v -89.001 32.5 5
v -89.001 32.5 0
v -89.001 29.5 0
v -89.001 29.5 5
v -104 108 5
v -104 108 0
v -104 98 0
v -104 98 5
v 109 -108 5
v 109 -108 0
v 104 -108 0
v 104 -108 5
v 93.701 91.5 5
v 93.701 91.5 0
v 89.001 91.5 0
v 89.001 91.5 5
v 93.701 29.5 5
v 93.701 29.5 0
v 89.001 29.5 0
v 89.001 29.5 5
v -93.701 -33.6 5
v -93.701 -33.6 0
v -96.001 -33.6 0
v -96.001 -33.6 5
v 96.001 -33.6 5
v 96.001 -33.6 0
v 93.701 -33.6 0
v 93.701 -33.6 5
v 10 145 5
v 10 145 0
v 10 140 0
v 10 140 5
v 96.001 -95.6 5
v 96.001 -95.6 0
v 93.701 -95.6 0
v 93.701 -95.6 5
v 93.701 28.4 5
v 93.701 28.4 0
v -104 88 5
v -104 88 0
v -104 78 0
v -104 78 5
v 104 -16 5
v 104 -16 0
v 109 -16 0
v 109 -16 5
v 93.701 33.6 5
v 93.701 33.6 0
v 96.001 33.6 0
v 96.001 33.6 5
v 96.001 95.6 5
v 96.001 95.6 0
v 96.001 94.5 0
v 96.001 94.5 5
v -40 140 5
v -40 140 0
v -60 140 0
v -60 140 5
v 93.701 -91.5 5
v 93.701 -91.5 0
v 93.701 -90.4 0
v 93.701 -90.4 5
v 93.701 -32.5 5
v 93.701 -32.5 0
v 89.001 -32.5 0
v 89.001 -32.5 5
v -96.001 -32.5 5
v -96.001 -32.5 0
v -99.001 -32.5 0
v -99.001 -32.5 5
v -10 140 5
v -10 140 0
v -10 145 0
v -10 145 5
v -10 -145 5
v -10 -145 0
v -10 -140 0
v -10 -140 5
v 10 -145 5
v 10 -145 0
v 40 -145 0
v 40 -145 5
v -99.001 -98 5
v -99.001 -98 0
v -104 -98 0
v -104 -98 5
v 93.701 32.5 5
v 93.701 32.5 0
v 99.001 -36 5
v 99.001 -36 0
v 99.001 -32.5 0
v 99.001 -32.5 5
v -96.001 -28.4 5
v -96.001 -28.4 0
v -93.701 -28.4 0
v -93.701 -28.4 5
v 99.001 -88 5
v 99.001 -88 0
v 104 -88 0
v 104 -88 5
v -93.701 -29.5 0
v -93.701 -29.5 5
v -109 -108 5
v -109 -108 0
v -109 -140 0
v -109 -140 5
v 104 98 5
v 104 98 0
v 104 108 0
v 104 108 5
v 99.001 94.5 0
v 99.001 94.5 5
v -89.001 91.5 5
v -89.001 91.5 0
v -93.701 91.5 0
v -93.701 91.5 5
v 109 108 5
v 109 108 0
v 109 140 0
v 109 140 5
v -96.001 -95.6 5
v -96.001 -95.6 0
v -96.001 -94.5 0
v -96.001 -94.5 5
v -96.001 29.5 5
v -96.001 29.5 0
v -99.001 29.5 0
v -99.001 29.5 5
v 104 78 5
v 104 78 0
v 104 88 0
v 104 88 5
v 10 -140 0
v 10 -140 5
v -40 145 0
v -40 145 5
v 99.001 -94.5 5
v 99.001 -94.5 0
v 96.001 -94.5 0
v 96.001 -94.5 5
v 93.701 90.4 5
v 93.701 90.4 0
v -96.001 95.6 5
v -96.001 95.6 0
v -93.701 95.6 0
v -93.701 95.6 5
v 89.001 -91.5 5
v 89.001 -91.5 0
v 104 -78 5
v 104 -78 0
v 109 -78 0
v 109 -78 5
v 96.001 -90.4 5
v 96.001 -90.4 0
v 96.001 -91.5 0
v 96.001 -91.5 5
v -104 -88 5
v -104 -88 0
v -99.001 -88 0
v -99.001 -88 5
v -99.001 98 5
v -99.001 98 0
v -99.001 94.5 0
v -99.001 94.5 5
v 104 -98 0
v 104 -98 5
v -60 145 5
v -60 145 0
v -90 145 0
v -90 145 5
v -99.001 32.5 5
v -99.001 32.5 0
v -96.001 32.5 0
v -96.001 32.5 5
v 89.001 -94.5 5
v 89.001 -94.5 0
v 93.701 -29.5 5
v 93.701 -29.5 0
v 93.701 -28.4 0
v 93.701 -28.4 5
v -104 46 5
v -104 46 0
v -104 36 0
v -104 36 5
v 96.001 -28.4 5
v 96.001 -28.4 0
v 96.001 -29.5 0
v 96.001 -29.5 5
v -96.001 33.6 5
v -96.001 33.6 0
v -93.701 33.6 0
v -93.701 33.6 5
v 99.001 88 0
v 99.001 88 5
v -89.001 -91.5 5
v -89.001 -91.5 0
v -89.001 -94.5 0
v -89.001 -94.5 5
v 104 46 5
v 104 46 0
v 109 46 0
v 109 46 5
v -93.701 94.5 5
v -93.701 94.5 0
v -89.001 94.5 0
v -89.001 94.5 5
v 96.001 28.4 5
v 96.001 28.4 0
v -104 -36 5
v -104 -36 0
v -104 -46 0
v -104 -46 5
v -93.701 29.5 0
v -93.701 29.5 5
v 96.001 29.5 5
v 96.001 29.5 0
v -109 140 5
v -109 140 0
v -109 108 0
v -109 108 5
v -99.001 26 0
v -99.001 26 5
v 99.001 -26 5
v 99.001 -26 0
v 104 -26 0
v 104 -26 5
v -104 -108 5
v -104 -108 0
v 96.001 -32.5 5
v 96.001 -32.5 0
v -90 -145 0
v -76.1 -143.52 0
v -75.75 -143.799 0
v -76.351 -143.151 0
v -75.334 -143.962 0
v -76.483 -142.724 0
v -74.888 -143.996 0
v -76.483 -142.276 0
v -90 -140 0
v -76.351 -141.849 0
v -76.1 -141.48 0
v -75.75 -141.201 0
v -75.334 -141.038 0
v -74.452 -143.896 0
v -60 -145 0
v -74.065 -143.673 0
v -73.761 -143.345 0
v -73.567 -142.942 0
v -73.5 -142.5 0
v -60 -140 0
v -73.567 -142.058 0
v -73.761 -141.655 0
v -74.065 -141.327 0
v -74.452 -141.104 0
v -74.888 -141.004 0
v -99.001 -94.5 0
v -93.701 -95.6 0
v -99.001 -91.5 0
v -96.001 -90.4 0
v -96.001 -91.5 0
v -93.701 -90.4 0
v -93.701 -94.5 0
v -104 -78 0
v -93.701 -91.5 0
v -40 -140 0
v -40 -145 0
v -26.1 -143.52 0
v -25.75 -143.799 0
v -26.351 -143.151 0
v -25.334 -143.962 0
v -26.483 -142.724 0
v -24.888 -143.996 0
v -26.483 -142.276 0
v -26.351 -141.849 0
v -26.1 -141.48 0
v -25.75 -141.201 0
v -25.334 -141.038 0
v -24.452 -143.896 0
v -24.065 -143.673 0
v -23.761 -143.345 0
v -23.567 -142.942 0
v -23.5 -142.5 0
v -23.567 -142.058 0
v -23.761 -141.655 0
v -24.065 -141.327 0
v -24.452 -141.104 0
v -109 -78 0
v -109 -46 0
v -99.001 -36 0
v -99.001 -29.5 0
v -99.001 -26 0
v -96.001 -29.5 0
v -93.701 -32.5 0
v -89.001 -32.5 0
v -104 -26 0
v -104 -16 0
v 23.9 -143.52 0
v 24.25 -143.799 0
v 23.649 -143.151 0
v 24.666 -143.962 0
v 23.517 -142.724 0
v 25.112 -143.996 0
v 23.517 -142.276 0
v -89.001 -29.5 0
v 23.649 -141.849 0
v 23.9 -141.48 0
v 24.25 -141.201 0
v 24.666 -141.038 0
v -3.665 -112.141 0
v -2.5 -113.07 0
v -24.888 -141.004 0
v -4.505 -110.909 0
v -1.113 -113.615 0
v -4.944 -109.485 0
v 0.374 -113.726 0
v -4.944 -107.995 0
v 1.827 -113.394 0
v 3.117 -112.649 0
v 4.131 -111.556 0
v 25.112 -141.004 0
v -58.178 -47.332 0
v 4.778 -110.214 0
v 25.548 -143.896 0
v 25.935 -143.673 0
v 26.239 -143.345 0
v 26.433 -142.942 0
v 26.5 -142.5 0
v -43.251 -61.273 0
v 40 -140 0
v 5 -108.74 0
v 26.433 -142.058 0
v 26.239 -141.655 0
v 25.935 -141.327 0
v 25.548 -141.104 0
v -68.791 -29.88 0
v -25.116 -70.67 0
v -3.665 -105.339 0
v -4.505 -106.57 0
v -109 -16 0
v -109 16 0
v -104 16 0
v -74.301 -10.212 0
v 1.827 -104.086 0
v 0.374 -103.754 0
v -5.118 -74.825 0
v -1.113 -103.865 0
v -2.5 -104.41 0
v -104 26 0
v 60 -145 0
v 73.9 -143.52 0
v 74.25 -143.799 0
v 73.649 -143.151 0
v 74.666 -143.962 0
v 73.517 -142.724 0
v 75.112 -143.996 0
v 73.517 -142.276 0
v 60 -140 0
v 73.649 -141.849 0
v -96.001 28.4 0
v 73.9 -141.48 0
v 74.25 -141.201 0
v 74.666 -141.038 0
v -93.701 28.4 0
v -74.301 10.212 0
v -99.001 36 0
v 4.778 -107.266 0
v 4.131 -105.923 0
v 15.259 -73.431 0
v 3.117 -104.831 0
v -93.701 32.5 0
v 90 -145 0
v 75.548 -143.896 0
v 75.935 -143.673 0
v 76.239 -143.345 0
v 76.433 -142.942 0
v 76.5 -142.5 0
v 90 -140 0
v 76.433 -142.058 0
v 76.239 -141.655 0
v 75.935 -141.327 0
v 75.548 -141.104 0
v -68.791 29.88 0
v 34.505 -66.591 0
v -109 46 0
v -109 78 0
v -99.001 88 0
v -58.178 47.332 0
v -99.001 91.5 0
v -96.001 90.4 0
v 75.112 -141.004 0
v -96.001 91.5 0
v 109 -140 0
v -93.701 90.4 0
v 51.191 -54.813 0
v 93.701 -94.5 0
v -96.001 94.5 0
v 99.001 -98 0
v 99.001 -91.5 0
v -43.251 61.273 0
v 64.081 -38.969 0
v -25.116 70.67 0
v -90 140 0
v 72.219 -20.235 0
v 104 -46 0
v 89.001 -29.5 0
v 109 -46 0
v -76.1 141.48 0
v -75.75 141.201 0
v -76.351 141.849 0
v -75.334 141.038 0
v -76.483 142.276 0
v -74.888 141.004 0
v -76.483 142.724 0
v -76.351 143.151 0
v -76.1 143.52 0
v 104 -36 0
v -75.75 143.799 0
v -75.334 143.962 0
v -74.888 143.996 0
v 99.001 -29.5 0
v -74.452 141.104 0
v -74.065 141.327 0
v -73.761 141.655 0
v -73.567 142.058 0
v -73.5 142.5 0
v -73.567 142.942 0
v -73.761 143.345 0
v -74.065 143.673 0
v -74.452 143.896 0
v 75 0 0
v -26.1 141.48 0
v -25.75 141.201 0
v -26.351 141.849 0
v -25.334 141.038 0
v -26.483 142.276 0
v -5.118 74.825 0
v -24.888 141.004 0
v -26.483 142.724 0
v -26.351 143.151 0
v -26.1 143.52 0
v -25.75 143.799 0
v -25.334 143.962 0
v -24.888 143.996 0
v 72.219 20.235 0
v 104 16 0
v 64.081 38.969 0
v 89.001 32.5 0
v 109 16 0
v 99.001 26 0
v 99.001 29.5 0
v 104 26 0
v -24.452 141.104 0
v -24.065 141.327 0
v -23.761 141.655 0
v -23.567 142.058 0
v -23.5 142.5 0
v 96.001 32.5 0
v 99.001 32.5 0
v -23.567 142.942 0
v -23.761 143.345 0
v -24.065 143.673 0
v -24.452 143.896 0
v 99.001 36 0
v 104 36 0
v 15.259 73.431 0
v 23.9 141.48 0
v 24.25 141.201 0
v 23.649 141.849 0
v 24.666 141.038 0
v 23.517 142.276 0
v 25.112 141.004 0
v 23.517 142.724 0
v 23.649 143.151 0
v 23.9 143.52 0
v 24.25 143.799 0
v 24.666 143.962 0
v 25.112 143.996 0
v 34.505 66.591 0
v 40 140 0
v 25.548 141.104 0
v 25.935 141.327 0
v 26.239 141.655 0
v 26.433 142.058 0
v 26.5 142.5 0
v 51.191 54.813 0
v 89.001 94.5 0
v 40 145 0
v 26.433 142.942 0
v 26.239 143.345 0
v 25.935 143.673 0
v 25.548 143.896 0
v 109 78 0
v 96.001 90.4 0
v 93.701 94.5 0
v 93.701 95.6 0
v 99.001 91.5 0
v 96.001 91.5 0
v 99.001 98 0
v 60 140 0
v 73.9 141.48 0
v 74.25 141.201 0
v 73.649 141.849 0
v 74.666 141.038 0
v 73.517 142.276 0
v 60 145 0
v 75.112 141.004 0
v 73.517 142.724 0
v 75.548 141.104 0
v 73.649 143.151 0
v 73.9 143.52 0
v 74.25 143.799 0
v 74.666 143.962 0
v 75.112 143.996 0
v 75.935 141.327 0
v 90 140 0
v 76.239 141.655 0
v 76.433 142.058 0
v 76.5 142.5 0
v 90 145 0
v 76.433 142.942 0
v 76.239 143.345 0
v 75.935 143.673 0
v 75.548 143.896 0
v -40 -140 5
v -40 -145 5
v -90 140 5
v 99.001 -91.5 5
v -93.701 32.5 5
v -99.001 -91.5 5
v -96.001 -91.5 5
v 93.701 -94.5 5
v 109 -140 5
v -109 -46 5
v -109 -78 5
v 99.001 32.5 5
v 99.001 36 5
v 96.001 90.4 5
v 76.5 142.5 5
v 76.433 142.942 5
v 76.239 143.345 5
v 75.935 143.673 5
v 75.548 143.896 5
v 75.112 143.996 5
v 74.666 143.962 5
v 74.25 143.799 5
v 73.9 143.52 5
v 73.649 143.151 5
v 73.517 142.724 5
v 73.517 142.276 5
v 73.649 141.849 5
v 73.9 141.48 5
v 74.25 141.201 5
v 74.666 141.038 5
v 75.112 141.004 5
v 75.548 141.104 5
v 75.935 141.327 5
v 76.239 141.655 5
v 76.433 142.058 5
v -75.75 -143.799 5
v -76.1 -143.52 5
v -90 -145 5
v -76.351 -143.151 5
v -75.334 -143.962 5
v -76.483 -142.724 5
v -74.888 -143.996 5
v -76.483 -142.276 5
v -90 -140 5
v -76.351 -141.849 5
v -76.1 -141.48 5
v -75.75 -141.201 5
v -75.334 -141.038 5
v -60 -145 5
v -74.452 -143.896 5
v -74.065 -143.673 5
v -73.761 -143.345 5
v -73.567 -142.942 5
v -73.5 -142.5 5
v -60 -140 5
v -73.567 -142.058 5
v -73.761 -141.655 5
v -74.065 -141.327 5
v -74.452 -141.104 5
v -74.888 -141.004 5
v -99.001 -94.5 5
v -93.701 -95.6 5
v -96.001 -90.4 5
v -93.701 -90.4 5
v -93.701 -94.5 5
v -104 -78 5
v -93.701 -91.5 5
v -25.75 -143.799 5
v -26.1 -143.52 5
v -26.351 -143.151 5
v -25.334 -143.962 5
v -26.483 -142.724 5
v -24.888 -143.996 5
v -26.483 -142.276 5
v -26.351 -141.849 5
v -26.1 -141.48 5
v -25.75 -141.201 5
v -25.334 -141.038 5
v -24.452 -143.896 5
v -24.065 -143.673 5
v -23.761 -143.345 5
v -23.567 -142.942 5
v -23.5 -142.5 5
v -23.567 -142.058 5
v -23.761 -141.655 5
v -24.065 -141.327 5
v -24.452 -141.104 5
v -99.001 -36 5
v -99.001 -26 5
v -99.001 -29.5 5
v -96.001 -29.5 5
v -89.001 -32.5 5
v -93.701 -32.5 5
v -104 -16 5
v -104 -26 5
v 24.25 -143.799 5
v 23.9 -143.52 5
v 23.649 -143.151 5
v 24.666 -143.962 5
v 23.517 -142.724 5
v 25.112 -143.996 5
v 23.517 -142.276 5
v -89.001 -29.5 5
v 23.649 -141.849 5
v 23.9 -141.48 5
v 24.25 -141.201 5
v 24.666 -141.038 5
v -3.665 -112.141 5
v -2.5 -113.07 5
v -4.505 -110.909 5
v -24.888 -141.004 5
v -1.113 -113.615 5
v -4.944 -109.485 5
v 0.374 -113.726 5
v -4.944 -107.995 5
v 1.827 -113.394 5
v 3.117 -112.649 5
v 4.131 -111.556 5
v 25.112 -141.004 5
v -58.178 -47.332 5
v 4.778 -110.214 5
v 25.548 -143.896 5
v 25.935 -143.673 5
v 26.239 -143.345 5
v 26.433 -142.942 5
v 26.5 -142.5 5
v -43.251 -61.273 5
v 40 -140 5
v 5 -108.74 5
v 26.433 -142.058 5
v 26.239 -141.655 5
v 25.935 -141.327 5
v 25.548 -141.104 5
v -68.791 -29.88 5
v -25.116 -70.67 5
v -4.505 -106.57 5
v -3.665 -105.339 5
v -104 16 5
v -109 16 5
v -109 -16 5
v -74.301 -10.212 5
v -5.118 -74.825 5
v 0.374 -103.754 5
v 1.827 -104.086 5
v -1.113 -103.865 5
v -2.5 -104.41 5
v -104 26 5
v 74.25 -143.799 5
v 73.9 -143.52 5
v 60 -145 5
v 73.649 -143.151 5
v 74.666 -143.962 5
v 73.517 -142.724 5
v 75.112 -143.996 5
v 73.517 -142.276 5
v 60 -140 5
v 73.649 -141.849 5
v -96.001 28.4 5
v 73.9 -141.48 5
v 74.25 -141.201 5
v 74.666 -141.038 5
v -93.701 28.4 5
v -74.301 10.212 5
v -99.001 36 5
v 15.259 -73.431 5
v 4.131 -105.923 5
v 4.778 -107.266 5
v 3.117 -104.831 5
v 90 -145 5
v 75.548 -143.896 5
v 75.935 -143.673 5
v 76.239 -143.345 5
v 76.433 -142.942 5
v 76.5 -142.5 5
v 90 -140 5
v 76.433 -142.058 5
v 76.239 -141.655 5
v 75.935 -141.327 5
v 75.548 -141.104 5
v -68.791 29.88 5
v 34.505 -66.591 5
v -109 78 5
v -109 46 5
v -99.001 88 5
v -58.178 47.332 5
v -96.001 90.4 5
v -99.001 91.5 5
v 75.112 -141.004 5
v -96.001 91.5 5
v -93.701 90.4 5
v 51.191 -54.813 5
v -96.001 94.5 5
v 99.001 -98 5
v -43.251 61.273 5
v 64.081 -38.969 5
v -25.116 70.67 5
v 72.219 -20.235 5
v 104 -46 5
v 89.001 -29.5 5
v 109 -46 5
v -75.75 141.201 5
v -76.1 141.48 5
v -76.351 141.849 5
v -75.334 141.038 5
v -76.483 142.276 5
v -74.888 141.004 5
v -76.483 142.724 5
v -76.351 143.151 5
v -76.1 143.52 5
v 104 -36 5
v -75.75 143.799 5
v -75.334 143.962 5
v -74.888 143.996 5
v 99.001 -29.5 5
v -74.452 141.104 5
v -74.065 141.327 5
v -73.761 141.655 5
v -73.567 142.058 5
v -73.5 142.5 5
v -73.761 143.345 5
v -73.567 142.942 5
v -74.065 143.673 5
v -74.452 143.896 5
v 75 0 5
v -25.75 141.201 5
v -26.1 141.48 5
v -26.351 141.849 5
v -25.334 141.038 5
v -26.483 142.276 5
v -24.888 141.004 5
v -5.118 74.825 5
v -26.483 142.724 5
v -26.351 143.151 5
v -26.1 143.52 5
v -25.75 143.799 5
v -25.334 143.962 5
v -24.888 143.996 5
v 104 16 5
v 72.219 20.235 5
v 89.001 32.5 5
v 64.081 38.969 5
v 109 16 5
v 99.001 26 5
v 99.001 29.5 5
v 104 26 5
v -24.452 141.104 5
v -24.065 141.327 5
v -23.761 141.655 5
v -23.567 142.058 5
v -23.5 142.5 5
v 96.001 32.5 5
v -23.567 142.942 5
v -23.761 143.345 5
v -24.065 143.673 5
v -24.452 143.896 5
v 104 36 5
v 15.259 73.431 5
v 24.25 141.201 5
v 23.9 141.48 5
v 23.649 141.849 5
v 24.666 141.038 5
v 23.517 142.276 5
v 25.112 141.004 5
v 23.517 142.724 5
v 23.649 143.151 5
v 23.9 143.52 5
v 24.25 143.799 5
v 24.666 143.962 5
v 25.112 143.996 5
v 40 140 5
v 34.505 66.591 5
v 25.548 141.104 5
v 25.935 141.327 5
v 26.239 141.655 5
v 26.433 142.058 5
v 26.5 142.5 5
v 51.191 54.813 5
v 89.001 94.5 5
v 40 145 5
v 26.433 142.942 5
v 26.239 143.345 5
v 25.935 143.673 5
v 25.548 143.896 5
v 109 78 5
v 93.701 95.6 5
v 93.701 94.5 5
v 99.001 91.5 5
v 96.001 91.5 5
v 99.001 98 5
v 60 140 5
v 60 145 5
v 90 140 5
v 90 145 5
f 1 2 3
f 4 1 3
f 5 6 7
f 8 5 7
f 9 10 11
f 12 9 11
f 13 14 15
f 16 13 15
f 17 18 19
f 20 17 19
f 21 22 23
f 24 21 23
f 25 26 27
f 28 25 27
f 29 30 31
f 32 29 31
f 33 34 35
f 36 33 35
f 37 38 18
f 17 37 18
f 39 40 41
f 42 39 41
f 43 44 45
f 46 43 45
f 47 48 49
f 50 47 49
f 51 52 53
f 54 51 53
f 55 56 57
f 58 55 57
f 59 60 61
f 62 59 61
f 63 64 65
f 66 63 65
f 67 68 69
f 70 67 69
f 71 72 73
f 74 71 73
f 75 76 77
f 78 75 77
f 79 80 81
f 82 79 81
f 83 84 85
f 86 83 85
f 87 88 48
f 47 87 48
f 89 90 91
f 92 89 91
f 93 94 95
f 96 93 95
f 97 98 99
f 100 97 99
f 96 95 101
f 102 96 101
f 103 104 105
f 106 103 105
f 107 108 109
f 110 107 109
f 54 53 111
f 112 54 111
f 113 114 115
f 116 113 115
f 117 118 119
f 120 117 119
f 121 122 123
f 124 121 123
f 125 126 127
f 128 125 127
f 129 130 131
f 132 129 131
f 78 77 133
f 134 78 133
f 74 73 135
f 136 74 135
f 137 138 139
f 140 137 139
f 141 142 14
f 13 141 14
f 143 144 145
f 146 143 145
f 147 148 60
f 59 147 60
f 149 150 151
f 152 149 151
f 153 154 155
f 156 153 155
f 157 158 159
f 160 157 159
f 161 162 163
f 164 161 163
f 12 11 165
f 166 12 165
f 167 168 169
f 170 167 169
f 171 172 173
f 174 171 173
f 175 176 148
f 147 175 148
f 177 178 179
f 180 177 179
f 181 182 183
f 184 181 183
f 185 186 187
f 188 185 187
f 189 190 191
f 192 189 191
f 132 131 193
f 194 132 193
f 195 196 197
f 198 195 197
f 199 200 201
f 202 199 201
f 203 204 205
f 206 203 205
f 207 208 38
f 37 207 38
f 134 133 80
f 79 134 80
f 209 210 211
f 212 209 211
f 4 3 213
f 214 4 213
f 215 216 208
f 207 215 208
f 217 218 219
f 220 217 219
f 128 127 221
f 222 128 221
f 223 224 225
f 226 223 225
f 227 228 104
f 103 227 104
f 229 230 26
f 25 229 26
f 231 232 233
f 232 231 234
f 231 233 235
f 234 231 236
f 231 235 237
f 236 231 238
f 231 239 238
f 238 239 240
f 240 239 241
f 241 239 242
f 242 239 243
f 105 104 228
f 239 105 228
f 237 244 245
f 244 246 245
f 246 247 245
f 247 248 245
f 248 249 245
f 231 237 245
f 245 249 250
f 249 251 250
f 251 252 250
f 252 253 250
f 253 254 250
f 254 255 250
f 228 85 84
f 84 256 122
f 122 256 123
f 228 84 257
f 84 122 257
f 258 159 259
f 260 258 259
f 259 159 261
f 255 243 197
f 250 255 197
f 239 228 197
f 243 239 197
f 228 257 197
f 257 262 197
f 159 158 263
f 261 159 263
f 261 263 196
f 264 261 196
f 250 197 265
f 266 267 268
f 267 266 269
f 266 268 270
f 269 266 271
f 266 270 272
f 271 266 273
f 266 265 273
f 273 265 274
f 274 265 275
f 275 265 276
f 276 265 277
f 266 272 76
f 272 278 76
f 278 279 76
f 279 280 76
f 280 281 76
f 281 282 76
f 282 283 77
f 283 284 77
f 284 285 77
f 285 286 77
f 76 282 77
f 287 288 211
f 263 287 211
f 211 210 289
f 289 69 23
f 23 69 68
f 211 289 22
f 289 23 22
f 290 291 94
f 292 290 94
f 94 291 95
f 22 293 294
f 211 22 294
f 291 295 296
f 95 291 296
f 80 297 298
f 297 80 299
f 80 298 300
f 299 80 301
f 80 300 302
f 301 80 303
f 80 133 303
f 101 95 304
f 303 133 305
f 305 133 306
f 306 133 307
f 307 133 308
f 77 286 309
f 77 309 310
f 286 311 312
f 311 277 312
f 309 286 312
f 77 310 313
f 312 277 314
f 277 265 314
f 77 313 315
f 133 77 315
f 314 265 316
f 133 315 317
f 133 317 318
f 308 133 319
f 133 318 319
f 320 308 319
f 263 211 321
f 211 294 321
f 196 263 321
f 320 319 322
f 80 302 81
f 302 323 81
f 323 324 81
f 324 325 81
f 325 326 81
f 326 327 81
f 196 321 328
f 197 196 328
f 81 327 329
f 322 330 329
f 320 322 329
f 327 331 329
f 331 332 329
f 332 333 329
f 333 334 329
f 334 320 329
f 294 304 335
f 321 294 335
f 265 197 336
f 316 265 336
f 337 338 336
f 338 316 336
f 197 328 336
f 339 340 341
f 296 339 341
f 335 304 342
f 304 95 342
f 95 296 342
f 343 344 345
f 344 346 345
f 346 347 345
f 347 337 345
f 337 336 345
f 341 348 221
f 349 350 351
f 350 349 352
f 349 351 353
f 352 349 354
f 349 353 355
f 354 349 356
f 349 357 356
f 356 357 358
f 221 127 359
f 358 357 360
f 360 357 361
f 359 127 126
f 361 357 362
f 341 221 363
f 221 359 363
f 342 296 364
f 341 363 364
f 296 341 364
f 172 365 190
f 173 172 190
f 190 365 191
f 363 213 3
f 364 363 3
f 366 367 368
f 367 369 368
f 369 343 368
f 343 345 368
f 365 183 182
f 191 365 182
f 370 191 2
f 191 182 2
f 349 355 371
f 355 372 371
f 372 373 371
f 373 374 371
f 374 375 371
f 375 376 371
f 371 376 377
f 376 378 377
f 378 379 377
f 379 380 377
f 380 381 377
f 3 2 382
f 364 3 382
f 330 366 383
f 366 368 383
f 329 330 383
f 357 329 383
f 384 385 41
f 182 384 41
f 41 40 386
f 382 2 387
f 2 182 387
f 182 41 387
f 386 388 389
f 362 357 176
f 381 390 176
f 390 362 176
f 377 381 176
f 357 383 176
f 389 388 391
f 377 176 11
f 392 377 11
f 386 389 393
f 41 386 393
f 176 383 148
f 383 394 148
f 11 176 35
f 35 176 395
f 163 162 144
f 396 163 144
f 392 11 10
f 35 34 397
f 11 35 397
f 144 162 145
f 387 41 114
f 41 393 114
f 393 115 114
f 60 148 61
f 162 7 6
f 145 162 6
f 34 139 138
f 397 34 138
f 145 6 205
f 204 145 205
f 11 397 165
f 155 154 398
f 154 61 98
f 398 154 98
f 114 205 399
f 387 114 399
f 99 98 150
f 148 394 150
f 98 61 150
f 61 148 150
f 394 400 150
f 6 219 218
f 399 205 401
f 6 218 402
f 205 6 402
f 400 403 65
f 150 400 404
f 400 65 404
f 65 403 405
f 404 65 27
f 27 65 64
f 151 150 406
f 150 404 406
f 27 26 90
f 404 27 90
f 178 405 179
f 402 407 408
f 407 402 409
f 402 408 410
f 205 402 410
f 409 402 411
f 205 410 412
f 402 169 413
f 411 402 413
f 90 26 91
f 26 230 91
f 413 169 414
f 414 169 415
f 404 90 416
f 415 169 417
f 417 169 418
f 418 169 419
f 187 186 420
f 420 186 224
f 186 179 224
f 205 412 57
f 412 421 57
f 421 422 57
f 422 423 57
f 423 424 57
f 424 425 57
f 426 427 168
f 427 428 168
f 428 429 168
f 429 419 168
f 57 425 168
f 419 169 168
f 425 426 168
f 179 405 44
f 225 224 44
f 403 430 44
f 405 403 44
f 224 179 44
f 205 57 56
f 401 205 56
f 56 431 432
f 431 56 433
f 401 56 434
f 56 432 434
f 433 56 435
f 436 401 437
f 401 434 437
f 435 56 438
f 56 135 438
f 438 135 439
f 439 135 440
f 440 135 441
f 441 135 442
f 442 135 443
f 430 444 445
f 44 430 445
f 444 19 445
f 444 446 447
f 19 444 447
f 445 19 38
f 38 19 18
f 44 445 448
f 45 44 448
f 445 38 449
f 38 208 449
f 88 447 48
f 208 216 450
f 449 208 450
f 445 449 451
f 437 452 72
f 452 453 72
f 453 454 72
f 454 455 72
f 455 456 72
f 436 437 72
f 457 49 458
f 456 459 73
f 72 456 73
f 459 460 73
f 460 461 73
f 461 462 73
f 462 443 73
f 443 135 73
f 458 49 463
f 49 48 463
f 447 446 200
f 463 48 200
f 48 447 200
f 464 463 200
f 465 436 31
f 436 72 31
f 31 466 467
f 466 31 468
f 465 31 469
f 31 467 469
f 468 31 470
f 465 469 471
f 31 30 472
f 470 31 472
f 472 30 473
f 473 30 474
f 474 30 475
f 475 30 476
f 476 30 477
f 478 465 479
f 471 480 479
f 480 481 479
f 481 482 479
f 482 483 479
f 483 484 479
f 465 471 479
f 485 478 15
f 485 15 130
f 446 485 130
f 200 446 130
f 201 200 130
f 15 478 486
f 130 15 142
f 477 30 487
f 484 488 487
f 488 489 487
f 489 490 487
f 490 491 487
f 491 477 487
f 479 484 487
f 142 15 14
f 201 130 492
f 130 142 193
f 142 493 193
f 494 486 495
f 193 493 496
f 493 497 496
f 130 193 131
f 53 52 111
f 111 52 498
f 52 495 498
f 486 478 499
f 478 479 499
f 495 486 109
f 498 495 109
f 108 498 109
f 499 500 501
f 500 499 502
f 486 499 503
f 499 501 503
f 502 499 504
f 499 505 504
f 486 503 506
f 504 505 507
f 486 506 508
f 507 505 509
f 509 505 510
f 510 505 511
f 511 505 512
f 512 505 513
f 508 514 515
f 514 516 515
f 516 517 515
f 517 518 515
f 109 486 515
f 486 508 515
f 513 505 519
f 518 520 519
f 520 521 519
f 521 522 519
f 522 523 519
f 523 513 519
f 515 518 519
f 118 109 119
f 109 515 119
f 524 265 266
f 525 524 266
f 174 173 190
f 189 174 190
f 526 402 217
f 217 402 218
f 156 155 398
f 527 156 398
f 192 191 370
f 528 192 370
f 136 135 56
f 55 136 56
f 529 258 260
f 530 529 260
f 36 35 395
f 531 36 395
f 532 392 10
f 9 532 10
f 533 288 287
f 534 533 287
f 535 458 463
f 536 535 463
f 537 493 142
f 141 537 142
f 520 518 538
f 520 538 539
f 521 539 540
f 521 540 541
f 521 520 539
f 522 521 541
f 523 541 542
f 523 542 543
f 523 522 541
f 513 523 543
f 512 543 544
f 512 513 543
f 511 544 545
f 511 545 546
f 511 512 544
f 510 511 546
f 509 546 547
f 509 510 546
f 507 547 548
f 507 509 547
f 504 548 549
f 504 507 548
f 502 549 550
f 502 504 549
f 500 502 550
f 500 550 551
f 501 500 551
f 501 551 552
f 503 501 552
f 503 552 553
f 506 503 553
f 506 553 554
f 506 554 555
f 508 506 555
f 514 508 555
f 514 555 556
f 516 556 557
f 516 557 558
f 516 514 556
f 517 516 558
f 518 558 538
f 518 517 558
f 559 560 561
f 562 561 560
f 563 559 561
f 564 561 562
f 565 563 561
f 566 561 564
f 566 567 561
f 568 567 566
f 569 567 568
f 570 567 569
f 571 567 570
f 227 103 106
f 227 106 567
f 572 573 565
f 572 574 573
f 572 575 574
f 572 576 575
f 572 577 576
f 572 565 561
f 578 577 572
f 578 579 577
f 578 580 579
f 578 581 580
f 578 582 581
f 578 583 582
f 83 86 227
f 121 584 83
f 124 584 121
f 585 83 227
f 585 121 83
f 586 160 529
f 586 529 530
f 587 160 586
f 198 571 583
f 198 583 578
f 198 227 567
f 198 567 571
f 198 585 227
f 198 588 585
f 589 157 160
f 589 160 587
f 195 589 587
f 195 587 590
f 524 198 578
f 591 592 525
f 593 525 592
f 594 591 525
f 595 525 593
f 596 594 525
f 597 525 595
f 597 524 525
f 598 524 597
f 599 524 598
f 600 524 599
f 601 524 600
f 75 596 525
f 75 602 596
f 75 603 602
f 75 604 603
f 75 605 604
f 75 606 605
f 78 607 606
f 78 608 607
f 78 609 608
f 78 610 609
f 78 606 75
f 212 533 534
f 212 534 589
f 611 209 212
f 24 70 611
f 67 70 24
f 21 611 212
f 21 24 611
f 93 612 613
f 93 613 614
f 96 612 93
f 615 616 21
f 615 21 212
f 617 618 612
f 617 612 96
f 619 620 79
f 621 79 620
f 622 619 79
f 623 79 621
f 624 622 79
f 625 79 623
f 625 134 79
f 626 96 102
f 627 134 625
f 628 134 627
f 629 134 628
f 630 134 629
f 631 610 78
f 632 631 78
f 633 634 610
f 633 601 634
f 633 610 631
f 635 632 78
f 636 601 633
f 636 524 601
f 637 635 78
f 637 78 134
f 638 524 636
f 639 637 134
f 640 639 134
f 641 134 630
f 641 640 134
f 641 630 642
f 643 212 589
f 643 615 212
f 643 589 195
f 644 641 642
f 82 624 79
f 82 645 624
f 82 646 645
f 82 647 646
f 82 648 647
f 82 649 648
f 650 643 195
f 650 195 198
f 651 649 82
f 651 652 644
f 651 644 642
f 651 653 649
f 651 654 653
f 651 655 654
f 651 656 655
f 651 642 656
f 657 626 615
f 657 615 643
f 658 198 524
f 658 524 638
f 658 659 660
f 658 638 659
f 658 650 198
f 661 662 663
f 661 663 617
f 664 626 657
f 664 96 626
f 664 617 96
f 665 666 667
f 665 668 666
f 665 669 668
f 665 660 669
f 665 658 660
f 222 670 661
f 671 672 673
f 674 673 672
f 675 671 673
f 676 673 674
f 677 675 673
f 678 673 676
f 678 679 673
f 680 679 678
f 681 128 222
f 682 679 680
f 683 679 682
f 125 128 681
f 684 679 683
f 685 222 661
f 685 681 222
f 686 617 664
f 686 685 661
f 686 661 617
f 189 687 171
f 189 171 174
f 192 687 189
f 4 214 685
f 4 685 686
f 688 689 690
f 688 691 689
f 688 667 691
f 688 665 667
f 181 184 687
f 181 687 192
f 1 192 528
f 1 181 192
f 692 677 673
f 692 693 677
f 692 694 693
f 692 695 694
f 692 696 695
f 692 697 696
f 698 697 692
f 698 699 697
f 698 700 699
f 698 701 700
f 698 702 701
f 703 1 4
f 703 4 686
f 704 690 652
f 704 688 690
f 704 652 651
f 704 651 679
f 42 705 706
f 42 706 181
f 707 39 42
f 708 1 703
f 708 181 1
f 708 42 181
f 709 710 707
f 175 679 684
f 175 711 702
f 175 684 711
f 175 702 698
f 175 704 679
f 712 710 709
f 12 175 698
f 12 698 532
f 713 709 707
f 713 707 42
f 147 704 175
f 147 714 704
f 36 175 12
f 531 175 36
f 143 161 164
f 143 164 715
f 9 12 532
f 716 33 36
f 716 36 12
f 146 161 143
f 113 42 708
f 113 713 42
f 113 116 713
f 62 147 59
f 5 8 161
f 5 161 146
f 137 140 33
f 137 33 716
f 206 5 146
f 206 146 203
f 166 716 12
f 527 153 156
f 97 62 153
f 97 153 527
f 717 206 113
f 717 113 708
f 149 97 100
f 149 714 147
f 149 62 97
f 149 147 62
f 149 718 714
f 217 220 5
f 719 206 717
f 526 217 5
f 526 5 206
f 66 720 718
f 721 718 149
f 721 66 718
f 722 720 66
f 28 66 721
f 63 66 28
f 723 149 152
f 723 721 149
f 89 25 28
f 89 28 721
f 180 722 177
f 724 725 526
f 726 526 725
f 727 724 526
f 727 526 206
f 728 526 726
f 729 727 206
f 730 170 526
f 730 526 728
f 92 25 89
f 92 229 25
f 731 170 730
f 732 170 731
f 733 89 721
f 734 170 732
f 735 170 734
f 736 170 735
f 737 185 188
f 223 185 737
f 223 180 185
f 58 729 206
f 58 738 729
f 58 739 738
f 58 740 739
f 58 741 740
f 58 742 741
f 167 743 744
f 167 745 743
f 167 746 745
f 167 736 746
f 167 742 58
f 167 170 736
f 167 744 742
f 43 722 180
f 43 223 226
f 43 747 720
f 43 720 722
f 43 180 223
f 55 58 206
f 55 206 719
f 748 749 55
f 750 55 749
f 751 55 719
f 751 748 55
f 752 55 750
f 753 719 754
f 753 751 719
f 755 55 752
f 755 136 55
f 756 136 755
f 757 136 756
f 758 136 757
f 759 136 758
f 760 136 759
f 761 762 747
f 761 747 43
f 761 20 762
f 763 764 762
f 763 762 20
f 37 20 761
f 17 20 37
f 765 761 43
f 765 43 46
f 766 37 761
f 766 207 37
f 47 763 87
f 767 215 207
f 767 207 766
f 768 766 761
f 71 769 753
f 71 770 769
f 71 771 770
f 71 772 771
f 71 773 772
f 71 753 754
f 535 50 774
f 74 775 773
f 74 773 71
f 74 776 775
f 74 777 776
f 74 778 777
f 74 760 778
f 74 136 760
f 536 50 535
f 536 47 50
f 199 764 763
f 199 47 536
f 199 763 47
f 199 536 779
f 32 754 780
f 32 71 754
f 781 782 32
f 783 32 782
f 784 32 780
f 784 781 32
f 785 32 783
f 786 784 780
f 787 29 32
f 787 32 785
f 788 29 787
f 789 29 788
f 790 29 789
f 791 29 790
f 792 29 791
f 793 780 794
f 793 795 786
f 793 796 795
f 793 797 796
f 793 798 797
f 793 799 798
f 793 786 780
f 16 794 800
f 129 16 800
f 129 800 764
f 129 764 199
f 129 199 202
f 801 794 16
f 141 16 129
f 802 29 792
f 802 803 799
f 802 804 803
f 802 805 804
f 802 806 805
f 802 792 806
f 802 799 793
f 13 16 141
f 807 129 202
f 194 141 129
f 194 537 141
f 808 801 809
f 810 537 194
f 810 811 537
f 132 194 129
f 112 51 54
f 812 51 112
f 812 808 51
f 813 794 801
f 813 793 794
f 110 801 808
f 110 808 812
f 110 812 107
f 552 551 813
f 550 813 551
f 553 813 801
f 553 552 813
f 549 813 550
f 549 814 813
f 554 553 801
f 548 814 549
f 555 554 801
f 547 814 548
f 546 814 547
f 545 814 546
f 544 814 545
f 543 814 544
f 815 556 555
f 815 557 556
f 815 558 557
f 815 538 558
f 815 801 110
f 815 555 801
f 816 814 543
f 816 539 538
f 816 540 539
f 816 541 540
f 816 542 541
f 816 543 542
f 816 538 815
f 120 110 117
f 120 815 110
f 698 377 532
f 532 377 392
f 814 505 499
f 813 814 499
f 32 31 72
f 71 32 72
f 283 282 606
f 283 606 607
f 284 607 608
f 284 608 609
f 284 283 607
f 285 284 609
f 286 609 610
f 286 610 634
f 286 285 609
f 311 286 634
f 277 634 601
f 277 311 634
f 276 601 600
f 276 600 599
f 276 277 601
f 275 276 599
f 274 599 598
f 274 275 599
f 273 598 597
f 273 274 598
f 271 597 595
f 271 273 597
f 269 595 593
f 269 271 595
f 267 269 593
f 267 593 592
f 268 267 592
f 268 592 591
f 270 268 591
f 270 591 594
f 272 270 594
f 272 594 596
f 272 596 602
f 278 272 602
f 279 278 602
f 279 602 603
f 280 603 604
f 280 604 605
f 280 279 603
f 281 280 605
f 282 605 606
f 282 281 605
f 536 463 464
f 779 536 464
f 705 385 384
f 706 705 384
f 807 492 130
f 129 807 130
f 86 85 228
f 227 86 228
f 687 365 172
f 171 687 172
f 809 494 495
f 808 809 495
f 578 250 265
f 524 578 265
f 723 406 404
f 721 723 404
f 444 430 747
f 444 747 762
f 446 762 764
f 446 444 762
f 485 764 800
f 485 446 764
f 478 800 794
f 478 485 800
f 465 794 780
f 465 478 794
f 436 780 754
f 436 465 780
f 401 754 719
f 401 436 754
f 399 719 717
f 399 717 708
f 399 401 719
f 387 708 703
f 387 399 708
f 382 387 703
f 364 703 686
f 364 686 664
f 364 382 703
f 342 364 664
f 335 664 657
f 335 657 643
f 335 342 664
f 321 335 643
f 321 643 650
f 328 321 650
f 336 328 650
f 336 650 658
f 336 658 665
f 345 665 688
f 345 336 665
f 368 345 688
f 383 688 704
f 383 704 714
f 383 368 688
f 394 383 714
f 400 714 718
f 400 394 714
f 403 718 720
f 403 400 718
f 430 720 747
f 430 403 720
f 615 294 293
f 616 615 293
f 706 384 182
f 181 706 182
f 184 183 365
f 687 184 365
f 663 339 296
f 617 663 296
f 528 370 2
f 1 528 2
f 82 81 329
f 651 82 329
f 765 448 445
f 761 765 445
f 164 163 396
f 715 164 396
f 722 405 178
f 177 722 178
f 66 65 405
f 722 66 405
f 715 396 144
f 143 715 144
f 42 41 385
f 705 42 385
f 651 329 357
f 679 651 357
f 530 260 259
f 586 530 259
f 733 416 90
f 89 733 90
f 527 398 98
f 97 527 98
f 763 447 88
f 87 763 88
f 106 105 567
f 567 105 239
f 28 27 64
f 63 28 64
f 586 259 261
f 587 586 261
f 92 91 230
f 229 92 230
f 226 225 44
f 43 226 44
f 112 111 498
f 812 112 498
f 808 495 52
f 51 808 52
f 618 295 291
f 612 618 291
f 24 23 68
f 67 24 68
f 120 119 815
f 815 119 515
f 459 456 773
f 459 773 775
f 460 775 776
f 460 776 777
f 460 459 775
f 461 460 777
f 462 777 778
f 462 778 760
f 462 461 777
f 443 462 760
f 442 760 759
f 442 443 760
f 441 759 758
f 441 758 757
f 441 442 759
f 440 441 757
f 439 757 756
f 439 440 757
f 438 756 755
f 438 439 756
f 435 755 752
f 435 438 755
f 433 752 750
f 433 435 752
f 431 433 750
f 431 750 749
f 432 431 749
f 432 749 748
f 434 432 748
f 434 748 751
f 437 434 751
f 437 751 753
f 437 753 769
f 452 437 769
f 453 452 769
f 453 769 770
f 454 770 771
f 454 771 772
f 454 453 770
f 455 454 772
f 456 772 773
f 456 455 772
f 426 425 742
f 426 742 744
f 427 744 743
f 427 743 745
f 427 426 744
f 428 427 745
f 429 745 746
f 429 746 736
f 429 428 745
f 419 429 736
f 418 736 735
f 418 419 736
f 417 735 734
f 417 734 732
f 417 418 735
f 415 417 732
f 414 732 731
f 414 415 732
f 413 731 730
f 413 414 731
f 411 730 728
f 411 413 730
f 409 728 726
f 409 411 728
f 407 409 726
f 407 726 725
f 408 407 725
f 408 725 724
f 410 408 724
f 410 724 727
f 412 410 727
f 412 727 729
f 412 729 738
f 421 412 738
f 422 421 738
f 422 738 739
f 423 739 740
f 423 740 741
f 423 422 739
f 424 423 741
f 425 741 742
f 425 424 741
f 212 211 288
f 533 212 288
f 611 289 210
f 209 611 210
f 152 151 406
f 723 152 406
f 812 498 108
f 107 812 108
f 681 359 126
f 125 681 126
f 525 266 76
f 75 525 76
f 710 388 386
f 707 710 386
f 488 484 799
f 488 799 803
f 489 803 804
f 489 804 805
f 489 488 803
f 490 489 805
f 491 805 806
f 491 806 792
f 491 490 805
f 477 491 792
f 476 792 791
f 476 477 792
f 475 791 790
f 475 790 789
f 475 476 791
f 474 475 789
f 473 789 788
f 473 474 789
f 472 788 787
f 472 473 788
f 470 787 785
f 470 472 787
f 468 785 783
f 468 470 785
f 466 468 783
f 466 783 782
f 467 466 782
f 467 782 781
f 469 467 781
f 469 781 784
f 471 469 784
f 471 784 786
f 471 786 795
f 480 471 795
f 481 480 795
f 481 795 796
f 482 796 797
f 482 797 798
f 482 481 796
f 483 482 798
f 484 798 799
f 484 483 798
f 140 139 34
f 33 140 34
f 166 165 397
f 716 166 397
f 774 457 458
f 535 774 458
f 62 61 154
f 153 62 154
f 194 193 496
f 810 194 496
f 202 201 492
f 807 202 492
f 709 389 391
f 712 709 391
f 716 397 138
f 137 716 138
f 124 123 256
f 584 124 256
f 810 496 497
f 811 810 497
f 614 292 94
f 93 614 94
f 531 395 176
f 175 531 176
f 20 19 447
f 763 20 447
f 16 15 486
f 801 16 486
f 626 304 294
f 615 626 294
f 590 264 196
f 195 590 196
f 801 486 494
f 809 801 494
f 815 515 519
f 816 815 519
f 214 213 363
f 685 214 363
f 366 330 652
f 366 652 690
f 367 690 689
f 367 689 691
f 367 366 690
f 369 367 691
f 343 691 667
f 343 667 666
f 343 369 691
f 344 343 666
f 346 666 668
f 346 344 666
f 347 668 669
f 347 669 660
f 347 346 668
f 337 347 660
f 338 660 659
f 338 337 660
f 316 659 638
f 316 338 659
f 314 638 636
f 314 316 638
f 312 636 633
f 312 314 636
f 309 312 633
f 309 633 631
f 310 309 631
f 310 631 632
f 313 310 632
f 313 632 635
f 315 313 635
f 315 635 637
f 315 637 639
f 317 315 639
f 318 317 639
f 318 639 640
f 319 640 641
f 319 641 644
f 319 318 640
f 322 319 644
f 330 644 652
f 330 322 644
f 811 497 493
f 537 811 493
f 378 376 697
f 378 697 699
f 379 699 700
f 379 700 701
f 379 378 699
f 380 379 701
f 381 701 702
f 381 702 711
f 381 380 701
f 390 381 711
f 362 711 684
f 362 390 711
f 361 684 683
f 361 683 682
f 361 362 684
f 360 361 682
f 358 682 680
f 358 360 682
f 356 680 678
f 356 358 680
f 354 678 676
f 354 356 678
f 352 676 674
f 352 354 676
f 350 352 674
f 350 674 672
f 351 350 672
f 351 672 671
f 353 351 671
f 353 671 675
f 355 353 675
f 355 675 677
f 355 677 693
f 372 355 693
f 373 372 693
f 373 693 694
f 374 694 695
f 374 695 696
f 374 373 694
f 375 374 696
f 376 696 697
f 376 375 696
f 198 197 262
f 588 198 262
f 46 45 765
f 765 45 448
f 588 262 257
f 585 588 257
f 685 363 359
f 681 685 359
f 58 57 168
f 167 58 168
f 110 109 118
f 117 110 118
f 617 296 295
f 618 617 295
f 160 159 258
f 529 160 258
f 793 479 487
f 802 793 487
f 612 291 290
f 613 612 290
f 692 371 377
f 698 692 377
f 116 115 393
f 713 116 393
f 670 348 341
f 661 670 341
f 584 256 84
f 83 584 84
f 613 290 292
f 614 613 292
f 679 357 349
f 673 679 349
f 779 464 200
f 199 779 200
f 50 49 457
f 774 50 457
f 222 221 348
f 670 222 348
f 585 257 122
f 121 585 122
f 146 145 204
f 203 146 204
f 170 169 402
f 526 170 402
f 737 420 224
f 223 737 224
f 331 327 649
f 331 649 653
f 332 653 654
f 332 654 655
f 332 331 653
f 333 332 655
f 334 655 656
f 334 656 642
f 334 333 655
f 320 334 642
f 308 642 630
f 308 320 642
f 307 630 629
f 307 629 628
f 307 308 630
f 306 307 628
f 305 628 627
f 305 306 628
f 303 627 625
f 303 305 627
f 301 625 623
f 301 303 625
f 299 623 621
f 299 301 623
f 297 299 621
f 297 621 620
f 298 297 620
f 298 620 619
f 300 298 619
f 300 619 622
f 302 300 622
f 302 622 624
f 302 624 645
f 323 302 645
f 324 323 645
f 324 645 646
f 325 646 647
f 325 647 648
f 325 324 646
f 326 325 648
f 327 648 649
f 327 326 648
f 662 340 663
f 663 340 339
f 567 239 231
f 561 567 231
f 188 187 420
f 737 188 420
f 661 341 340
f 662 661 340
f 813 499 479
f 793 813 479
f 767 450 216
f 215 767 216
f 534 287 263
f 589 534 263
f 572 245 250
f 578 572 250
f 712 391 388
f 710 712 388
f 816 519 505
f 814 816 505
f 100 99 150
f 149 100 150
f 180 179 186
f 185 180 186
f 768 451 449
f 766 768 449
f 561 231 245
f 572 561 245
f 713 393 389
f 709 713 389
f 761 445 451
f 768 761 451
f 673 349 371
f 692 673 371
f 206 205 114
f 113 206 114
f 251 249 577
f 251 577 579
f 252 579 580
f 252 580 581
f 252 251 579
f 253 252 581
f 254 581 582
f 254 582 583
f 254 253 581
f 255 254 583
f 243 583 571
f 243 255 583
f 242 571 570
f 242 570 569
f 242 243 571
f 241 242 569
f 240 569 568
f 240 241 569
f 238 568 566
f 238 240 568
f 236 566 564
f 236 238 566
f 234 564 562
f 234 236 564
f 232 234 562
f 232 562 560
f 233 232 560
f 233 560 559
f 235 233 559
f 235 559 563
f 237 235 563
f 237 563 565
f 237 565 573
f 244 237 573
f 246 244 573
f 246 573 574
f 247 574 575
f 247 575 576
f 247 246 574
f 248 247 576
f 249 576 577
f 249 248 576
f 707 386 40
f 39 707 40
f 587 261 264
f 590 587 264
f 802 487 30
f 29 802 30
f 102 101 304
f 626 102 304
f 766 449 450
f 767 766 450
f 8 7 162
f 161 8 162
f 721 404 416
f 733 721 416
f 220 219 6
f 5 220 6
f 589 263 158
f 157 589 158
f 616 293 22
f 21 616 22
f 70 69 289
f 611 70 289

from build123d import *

# Parameters (mm, degrees)
SKETCH1_R           = 1.5
SKETCH1_R_2         = 5
SKETCH1_R_3         = 75
BOSS_EXTRUDE1_DEPTH = 5


with BuildPart() as part:
    # Sketch1 → Boss-Extrude1 (new body)
    with BuildSketch(Plane.XY):
        Polygon((-90, 145.000003033), (-90, 140.000003033), (-109, 140.000003033), (-109, 108.00000182), (-104, 108.00000182), (-104, 98.00000182), (-99.000966482, 98.00000182), (-99.000966482, 94.50000182), (-96.000966482, 94.50000182), (-96.000966482, 95.60000182), (-93.700966482, 95.60000182), (-93.700966482, 94.50000182), (-89.000966482, 94.50000182), (-89.000966482, 91.50000182), (-93.700966482, 91.50000182), (-93.700966482, 90.40000182), (-96.000966482, 90.40000182), (-96.000966482, 91.50000182), (-99.000966482, 91.50000182), (-99.000966482, 88.00000182), (-104, 88.00000182), (-104, 78.00000182), (-109, 78.00000182), (-109, 46.000000607), (-104, 46.000000607), (-104, 36.000000607), (-99.000966482, 36.000000607), (-99.000966482, 32.500000607), (-96.000966482, 32.500000607), (-96.000966482, 33.600000607), (-93.700966482, 33.600000607), (-93.700966482, 32.500000607), (-89.000966482, 32.500000607), (-89.000966482, 29.500000607), (-93.700966482, 29.500000607), (-93.700966482, 28.400000607), (-96.000966482, 28.400000607), (-96.000966482, 29.500000607), (-99.000966482, 29.500000607), (-99.000966482, 26.000000607), (-104, 26.000000607), (-104, 16.000000607), (-109, 16.000000607), (-109, -16.000000607), (-104, -16.000000607), (-104, -26.000000607), (-99.000966482, -26.000000607), (-99.000966482, -29.500000607), (-96.000966482, -29.500000607), (-96.000966482, -28.400000607), (-93.700966482, -28.400000607), (-93.700966482, -29.500000607), (-89.000966482, -29.500000607), (-89.000966482, -32.500000607), (-93.700966482, -32.500000607), (-93.700966482, -33.600000607), (-96.000966482, -33.600000607), (-96.000966482, -32.500000607), (-99.000966482, -32.500000607), (-99.000966482, -36.000000607), (-104, -36.000000607), (-104, -46.000000607), (-109, -46.000000607), (-109, -78.00000182), (-104, -78.00000182), (-104, -88.00000182), (-99.000966482, -88.00000182), (-99.000966482, -91.50000182), (-96.000966482, -91.50000182), (-96.000966482, -90.40000182), (-93.700966482, -90.40000182), (-93.700966482, -91.50000182), (-89.000966482, -91.50000182), (-89.000966482, -94.50000182), (-93.700966482, -94.50000182), (-93.700966482, -95.60000182), (-96.000966482, -95.60000182), (-96.000966482, -94.50000182), (-99.000966482, -94.50000182), (-99.000966482, -98.00000182), (-104, -98.00000182), (-104, -108.00000182), (-109, -108.00000182), (-109, -140.000003033), (-90, -140.000003033), (-90, -145.000003033), (-60, -145.000003033), (-60, -140.000003033), (-40, -140.000003033), (-40, -145.000003033), (-10, -145.000003033), (-10, -140.000003033), (10, -140.000003033), (10, -145.000003033), (40, -145.000003033), (40, -140.000003033), (60, -140.000003033), (60, -145.000003033), (90, -145.000003033), (90, -140.000003033), (109, -140.000003033), (109, -108.00000182), (104, -108.00000182), (104, -98.00000182), (99.000966482, -98.00000182), (99.000966482, -94.50000182), (96.000966482, -94.50000182), (96.000966482, -95.60000182), (93.700966482, -95.60000182), (93.700966482, -94.50000182), (89.000966482, -94.50000182), (89.000966482, -91.50000182), (93.700966482, -91.50000182), (93.700966482, -90.40000182), (96.000966482, -90.40000182), (96.000966482, -91.50000182), (99.000966482, -91.50000182), (99.000966482, -88.00000182), (104, -88.00000182), (104, -78.00000182), (109, -78.00000182), (109, -46.000000607), (104, -46.000000607), (104, -36.000000607), (99.000966482, -36.000000607), (99.000966482, -32.500000607), (96.000966482, -32.500000607), (96.000966482, -33.600000607), (93.700966482, -33.600000607), (93.700966482, -32.500000607), (89.000966482, -32.500000607), (89.000966482, -29.500000607), (93.700966482, -29.500000607), (93.700966482, -28.400000607), (96.000966482, -28.400000607), (96.000966482, -29.500000607), (99.000966482, -29.500000607), (99.000966482, -26.000000607), (104, -26.000000607), (104, -16.000000607), (109, -16.000000607), (109, 16.000000607), (104, 16.000000607), (104, 26.000000607), (99.000966482, 26.000000607), (99.000966482, 29.500000607), (96.000966482, 29.500000607), (96.000966482, 28.400000607), (93.700966482, 28.400000607), (93.700966482, 29.500000607), (89.000966482, 29.500000607), (89.000966482, 32.500000607), (93.700966482, 32.500000607), (93.700966482, 33.600000607), (96.000966482, 33.600000607), (96.000966482, 32.500000607), (99.000966482, 32.500000607), (99.000966482, 36.000000607), (104, 36.000000607), (104, 46.000000607), (109, 46.000000607), (109, 78.00000182), (104, 78.00000182), (104, 88.00000182), (99.000966482, 88.00000182), (99.000966482, 91.50000182), (96.000966482, 91.50000182), (96.000966482, 90.40000182), (93.700966482, 90.40000182), (93.700966482, 91.50000182), (89.000966482, 91.50000182), (89.000966482, 94.50000182), (93.700966482, 94.50000182), (93.700966482, 95.60000182), (96.000966482, 95.60000182), (96.000966482, 94.50000182), (99.000966482, 94.50000182), (99.000966482, 98.00000182), (104, 98.00000182), (104, 108.00000182), (109, 108.00000182), (109, 140.000003033), (90, 140.000003033), (90, 145.000003033), (60, 145.000003033), (60, 140.000003033), (40, 140.000003033), (40, 145.000003033), (10, 145.000003033), (10, 140.000003033), (-10, 140.000003033), (-10, 145.000003033), (-40, 145.000003033), (-40, 140.000003033), (-60, 140.000003033), (-60, 145.000003033), align=None)
        with Locations((-75, -142.500003033)):
            Circle(SKETCH1_R, mode=Mode.SUBTRACT)
        with Locations((-25, -142.500003033)):
            Circle(SKETCH1_R, mode=Mode.SUBTRACT)
        with Locations((25, -142.500003033)):
            Circle(SKETCH1_R, mode=Mode.SUBTRACT)
        with Locations((0, -108.739893094)):
            Circle(SKETCH1_R_2, mode=Mode.SUBTRACT)
        with Locations((75, -142.500003033)):
            Circle(SKETCH1_R, mode=Mode.SUBTRACT)
        with Locations((-75, 142.500003033)):
            Circle(SKETCH1_R, mode=Mode.SUBTRACT)
        with Locations((-25, 142.500003033)):
            Circle(SKETCH1_R, mode=Mode.SUBTRACT)
        Circle(SKETCH1_R_3, mode=Mode.SUBTRACT)
        with Locations((25, 142.500003033)):
            Circle(SKETCH1_R, mode=Mode.SUBTRACT)
        with Locations((75, 142.500003033)):
            Circle(SKETCH1_R, mode=Mode.SUBTRACT)
    extrude(amount=BOSS_EXTRUDE1_DEPTH)


solid = part.part
